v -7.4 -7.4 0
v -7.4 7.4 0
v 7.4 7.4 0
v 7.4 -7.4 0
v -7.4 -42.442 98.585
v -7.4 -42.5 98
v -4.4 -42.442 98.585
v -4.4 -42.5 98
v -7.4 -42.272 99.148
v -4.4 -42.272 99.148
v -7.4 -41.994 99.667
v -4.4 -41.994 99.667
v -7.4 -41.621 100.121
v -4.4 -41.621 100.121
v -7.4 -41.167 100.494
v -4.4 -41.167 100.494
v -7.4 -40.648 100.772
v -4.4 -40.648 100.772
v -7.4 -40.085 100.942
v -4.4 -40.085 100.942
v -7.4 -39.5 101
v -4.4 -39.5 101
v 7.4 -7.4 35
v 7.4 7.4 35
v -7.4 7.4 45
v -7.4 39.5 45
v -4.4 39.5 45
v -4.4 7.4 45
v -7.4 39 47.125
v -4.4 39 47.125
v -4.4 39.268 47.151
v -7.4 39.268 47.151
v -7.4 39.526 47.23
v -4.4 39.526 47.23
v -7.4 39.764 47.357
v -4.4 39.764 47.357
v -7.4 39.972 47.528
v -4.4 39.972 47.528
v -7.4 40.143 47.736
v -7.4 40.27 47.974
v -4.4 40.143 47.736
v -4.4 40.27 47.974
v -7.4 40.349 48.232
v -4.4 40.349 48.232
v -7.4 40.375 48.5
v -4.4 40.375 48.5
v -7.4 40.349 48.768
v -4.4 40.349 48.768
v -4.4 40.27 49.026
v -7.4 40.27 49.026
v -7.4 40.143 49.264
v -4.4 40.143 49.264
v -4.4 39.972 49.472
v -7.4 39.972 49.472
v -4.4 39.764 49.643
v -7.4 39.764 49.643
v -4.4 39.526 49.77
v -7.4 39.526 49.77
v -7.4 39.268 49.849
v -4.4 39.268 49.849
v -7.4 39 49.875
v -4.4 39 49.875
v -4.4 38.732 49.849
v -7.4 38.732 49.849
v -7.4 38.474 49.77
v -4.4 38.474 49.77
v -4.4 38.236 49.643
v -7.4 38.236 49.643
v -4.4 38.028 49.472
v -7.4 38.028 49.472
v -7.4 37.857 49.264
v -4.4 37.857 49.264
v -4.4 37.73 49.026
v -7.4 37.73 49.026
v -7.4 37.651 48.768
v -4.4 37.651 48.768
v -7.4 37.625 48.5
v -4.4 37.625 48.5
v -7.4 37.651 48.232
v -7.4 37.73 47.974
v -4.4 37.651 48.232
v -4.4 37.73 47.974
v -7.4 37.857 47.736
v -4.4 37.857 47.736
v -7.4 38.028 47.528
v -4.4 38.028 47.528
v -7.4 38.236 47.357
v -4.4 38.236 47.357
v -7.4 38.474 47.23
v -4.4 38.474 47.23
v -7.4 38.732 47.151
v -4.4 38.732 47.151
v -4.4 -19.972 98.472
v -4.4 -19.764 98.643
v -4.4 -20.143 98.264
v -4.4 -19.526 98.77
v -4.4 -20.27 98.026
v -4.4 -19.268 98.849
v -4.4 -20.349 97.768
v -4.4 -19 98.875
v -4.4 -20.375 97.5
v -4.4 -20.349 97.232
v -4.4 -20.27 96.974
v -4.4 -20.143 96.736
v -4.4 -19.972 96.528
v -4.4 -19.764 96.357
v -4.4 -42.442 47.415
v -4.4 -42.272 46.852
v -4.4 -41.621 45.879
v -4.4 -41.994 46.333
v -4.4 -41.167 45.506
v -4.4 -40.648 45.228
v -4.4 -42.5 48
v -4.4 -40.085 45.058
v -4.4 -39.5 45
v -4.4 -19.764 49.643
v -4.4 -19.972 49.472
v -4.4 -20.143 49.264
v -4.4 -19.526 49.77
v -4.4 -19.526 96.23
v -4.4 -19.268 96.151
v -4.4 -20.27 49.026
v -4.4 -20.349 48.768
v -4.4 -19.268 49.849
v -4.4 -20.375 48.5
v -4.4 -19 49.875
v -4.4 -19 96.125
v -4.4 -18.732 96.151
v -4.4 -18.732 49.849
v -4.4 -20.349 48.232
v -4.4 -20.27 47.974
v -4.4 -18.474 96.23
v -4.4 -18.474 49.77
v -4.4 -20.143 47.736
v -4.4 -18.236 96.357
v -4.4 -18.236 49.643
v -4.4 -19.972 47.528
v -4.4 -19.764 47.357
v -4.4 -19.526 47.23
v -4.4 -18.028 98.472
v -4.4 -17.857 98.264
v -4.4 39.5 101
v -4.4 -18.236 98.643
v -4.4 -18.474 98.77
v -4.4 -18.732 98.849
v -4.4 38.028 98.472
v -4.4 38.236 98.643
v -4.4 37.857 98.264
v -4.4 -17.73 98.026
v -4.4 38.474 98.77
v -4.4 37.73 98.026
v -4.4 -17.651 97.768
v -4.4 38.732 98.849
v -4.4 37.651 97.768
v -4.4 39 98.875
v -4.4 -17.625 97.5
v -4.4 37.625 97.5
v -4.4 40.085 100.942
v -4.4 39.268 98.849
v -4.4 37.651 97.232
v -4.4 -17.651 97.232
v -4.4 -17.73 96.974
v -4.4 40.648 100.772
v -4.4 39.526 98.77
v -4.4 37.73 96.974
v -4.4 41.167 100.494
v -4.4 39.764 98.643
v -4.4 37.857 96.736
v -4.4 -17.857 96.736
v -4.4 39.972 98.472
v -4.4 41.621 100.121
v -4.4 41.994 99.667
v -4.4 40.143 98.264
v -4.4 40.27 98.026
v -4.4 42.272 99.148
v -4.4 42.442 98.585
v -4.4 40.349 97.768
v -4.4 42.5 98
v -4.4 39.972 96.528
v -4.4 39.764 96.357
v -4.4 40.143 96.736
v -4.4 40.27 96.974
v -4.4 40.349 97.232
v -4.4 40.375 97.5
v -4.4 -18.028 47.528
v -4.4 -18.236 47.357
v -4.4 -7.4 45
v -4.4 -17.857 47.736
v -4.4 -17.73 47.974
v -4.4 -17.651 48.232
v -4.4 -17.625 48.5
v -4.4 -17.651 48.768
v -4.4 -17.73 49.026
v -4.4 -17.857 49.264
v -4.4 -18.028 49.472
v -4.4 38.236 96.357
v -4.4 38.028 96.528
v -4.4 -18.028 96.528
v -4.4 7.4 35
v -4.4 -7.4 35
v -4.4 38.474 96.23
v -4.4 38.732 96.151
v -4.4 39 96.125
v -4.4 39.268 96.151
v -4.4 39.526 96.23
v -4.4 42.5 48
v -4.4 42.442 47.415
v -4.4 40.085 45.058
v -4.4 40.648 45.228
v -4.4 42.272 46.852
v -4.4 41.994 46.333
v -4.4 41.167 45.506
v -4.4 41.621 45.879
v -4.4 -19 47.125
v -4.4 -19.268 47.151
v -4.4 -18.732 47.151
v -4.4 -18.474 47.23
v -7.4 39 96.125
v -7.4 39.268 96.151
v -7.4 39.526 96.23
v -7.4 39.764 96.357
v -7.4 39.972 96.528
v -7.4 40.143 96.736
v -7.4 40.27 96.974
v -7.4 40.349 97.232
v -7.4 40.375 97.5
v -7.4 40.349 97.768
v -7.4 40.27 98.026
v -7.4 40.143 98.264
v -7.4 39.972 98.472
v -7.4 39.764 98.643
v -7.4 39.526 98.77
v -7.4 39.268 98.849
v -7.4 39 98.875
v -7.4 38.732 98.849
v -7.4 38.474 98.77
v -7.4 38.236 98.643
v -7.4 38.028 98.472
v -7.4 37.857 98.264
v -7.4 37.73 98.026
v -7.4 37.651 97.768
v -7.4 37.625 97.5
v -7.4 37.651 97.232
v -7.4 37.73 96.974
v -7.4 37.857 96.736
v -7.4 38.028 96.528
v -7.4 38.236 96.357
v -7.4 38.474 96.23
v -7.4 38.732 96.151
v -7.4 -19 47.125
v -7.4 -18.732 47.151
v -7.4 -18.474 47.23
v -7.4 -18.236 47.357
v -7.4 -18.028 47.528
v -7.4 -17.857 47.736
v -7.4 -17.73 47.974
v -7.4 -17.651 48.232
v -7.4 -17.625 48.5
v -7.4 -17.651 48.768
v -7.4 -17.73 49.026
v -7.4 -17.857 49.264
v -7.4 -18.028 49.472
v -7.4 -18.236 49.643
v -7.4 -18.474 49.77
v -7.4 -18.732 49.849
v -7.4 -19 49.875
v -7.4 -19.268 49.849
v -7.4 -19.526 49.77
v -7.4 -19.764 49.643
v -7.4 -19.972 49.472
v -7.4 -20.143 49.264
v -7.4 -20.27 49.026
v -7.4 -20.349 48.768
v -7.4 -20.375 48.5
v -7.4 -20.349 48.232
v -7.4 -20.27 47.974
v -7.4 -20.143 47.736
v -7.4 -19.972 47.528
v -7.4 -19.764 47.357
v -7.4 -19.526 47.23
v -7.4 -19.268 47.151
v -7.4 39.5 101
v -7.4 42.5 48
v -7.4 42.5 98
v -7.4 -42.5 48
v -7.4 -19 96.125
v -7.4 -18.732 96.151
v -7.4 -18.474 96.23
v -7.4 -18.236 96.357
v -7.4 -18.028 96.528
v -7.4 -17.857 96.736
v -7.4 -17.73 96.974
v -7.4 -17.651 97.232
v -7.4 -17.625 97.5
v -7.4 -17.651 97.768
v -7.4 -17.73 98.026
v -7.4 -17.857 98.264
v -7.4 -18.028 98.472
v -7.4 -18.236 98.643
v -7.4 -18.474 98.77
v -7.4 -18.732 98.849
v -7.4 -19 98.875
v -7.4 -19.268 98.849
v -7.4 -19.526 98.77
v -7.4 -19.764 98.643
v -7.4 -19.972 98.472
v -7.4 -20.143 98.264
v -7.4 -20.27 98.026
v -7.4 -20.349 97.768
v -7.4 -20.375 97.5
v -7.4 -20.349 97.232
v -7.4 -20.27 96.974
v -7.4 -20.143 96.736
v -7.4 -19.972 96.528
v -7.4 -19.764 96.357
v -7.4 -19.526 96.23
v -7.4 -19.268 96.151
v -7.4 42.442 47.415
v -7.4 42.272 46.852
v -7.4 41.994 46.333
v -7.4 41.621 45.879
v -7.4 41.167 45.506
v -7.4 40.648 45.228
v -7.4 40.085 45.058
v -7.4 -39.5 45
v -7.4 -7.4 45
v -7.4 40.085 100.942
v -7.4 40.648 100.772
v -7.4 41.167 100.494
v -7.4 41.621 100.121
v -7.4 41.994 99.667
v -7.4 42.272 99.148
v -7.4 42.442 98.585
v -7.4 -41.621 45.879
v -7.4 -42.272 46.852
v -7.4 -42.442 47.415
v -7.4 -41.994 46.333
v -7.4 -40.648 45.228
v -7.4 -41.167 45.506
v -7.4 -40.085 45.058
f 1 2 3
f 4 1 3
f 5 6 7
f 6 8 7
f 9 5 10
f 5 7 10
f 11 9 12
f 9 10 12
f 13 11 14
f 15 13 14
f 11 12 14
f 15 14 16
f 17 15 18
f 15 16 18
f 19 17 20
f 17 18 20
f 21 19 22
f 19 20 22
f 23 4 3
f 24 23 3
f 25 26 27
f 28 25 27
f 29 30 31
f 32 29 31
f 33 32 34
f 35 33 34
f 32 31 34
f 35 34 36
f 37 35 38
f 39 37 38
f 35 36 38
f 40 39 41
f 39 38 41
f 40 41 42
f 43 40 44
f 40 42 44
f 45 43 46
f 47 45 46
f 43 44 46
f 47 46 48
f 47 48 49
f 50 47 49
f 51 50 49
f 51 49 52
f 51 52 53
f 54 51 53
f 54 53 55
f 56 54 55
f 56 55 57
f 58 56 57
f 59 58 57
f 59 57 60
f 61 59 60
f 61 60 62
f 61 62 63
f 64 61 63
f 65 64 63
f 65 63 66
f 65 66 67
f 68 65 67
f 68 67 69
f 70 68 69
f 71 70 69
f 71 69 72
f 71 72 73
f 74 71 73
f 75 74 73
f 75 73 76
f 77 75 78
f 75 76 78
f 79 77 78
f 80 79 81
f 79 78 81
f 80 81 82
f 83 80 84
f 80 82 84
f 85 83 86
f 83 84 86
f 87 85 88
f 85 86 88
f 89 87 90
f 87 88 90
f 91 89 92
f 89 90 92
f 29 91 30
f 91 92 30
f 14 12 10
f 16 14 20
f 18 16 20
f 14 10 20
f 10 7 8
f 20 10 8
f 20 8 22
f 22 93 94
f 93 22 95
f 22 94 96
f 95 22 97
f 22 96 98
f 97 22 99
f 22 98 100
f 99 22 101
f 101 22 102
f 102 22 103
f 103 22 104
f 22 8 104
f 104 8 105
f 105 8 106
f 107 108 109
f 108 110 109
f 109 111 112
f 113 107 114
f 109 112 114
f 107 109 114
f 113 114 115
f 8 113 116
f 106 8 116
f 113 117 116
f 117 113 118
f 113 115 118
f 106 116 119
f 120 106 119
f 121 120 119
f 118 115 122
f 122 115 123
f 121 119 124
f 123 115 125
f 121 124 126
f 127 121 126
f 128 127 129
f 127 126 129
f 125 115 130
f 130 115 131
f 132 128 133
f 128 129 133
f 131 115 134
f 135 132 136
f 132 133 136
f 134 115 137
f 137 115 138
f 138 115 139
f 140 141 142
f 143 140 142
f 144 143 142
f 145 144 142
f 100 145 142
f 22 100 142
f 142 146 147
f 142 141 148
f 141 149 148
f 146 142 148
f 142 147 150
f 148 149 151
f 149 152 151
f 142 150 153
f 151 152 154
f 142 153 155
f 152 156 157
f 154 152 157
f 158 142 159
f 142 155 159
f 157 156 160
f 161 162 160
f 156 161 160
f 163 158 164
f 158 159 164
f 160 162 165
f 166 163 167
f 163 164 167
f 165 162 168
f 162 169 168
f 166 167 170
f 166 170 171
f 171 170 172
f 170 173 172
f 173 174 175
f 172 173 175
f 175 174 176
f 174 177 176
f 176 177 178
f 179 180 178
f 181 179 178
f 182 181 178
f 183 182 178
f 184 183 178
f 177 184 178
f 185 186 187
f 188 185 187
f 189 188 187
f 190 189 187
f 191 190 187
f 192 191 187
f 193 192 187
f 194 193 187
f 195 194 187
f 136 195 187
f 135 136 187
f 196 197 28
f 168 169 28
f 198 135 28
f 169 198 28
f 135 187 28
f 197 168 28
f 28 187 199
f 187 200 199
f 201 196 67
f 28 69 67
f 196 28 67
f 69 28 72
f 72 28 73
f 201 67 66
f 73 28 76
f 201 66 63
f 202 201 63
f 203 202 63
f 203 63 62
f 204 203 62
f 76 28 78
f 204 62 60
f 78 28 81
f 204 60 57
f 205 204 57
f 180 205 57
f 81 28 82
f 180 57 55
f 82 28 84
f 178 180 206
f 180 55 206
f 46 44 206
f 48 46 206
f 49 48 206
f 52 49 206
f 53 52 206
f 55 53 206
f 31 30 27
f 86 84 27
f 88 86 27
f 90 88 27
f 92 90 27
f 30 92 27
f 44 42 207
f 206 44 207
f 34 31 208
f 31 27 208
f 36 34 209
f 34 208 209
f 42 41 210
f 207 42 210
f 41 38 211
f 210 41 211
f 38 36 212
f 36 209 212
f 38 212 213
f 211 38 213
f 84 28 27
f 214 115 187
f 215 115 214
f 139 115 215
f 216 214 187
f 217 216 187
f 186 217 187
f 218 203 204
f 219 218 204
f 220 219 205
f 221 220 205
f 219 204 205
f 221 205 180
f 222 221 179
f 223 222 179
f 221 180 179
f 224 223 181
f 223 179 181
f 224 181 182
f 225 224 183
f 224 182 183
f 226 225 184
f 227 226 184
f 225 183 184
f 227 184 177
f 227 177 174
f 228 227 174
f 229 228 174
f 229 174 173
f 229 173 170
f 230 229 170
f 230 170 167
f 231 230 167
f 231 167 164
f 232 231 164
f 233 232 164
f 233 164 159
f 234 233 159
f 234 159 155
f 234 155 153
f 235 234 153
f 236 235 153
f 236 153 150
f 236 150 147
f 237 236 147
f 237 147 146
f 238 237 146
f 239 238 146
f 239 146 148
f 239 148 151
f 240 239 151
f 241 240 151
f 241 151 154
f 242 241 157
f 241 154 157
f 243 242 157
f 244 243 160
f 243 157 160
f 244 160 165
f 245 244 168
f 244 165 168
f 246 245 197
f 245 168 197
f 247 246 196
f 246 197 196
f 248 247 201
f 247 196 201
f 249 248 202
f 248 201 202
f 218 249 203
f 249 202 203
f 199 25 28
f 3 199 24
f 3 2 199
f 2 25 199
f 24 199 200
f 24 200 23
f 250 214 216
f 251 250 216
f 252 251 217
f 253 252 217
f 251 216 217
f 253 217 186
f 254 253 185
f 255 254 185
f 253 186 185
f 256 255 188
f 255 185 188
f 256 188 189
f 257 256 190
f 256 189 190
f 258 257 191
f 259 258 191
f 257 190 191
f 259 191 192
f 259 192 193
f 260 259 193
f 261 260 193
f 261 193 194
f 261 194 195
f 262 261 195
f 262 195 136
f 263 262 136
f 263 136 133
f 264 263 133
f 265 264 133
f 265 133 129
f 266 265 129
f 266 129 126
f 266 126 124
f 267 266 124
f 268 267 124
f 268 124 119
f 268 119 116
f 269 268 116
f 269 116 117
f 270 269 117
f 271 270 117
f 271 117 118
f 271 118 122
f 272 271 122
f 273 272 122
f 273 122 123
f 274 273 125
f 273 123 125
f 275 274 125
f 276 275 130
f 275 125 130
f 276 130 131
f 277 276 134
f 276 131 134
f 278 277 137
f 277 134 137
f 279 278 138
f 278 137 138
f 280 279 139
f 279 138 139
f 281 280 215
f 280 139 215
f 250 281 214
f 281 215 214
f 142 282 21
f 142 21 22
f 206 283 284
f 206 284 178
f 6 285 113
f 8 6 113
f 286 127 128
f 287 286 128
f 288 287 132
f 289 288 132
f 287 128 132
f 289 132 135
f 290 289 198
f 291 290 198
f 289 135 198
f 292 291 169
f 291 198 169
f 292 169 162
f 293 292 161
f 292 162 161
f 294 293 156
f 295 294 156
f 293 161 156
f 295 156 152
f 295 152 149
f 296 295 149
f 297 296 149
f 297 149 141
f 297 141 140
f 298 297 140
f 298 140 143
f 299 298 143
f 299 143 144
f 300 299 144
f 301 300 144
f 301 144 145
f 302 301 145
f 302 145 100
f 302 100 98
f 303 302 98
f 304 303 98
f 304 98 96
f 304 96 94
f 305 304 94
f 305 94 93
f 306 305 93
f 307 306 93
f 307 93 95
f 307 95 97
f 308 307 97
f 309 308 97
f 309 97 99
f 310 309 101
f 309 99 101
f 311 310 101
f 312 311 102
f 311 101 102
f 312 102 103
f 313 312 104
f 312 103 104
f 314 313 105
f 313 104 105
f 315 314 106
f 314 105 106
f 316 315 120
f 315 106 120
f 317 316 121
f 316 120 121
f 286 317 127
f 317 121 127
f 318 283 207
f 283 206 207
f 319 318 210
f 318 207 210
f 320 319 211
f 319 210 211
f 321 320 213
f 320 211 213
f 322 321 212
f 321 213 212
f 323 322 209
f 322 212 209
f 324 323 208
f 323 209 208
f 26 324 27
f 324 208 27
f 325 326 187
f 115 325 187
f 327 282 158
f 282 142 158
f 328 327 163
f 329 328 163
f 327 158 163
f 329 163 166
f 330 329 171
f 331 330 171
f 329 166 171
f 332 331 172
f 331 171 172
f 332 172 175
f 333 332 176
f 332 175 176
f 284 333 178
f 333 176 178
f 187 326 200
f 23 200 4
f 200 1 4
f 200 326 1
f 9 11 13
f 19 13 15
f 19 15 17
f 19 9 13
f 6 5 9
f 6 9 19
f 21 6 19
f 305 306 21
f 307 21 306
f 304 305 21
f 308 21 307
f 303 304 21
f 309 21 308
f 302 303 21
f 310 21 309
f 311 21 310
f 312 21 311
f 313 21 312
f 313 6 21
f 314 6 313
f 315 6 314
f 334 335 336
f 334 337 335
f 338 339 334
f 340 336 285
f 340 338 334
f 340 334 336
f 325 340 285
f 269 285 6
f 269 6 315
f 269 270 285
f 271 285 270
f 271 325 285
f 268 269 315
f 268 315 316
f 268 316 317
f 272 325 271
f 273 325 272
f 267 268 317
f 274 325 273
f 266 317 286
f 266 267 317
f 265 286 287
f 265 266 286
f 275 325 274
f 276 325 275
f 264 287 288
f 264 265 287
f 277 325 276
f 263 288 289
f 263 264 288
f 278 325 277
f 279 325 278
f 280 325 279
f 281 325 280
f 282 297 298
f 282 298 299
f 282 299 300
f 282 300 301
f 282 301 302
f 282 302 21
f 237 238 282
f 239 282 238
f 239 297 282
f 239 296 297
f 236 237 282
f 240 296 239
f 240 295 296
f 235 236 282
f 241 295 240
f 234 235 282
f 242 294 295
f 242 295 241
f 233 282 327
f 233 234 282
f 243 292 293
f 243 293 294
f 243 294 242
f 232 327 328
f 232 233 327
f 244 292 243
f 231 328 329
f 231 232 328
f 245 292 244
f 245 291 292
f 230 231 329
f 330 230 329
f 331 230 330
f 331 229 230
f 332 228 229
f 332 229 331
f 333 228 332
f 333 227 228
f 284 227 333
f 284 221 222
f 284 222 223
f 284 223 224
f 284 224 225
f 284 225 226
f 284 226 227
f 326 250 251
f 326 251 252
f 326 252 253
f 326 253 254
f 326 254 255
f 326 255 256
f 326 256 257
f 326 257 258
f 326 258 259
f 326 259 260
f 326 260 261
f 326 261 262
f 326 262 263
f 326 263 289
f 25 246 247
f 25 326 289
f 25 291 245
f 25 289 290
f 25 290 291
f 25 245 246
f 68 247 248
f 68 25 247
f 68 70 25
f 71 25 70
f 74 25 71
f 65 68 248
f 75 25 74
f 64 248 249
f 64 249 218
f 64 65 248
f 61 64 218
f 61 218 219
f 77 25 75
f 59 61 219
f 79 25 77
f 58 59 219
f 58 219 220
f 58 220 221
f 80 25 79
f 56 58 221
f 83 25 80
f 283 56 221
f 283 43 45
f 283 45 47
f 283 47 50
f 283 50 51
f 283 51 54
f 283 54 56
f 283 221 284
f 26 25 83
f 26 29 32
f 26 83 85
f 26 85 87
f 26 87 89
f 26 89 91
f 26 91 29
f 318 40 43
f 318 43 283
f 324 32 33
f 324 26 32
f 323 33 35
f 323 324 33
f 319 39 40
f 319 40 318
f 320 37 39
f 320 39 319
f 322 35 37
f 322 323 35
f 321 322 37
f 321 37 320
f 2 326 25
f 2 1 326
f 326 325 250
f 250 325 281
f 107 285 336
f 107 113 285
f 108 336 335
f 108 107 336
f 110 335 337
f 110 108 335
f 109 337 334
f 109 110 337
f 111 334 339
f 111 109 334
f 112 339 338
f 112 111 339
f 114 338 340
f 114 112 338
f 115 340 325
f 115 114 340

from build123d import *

# Parameters (mm, degrees)
SKETCH1_W           = 14.8
SKETCH1_H           = 14.8
BOSS_EXTRUDE1_DEPTH = 35
SKETCH3_W           = 3
SKETCH3_H           = 14.8
BOSS_EXTRUDE3_DEPTH = 10
SKETCH5_W           = 3
SKETCH5_H           = 85
BOSS_EXTRUDE4_DEPTH = 56
SKETCH6_R           = 1.375
CUT_EXTRUDE1_DEPTH  = 5
FILLET2_R           = 3


with BuildPart() as part:
    # Sketch1 → Boss-Extrude1 (new body)
    with BuildSketch(Plane.XY):
        Rectangle(SKETCH1_W, SKETCH1_H)
    extrude(amount=BOSS_EXTRUDE1_DEPTH)

    # Sketch3 → Boss-Extrude3 (add)
    with BuildSketch(Plane.XY.offset(35)):
        with Locations((-5.9, 0)):
            Rectangle(SKETCH3_W, SKETCH3_H)
    extrude(amount=BOSS_EXTRUDE3_DEPTH)

    # Sketch5 → Boss-Extrude4 (add)
    with BuildSketch(Plane.XY.offset(45)):
        with Locations((-5.9, 0)):
            Rectangle(SKETCH5_W, SKETCH5_H)
    extrude(amount=BOSS_EXTRUDE4_DEPTH)

    # Sketch6 → Cut-Extrude1 (cut)
    with BuildSketch(Plane(origin=(-4.4, 0, 0), x_dir=(0, 0, -1), z_dir=(1, 0, 0))):
        with Locations((-97.5, 39)):
            Circle(SKETCH6_R)
        with Locations((-48.5, 39)):
            Circle(SKETCH6_R)
        with Locations((-48.5, -19)):
            Circle(SKETCH6_R)
        with Locations((-97.5, -19)):
            Circle(SKETCH6_R)
    extrude(amount=-CUT_EXTRUDE1_DEPTH, mode=Mode.SUBTRACT)

    # Fillet2
    fillet2_edges = [part.edges().sort_by_distance(p)[0] for p in [
        (-5.9, -42.5, 45),
        (-5.9, 42.5, 45),
        (-5.9, -42.5, 101),
        (-5.9, 42.5, 101),
    ]]
    fillet(fillet2_edges, radius=FILLET2_R)


solid = part.part
